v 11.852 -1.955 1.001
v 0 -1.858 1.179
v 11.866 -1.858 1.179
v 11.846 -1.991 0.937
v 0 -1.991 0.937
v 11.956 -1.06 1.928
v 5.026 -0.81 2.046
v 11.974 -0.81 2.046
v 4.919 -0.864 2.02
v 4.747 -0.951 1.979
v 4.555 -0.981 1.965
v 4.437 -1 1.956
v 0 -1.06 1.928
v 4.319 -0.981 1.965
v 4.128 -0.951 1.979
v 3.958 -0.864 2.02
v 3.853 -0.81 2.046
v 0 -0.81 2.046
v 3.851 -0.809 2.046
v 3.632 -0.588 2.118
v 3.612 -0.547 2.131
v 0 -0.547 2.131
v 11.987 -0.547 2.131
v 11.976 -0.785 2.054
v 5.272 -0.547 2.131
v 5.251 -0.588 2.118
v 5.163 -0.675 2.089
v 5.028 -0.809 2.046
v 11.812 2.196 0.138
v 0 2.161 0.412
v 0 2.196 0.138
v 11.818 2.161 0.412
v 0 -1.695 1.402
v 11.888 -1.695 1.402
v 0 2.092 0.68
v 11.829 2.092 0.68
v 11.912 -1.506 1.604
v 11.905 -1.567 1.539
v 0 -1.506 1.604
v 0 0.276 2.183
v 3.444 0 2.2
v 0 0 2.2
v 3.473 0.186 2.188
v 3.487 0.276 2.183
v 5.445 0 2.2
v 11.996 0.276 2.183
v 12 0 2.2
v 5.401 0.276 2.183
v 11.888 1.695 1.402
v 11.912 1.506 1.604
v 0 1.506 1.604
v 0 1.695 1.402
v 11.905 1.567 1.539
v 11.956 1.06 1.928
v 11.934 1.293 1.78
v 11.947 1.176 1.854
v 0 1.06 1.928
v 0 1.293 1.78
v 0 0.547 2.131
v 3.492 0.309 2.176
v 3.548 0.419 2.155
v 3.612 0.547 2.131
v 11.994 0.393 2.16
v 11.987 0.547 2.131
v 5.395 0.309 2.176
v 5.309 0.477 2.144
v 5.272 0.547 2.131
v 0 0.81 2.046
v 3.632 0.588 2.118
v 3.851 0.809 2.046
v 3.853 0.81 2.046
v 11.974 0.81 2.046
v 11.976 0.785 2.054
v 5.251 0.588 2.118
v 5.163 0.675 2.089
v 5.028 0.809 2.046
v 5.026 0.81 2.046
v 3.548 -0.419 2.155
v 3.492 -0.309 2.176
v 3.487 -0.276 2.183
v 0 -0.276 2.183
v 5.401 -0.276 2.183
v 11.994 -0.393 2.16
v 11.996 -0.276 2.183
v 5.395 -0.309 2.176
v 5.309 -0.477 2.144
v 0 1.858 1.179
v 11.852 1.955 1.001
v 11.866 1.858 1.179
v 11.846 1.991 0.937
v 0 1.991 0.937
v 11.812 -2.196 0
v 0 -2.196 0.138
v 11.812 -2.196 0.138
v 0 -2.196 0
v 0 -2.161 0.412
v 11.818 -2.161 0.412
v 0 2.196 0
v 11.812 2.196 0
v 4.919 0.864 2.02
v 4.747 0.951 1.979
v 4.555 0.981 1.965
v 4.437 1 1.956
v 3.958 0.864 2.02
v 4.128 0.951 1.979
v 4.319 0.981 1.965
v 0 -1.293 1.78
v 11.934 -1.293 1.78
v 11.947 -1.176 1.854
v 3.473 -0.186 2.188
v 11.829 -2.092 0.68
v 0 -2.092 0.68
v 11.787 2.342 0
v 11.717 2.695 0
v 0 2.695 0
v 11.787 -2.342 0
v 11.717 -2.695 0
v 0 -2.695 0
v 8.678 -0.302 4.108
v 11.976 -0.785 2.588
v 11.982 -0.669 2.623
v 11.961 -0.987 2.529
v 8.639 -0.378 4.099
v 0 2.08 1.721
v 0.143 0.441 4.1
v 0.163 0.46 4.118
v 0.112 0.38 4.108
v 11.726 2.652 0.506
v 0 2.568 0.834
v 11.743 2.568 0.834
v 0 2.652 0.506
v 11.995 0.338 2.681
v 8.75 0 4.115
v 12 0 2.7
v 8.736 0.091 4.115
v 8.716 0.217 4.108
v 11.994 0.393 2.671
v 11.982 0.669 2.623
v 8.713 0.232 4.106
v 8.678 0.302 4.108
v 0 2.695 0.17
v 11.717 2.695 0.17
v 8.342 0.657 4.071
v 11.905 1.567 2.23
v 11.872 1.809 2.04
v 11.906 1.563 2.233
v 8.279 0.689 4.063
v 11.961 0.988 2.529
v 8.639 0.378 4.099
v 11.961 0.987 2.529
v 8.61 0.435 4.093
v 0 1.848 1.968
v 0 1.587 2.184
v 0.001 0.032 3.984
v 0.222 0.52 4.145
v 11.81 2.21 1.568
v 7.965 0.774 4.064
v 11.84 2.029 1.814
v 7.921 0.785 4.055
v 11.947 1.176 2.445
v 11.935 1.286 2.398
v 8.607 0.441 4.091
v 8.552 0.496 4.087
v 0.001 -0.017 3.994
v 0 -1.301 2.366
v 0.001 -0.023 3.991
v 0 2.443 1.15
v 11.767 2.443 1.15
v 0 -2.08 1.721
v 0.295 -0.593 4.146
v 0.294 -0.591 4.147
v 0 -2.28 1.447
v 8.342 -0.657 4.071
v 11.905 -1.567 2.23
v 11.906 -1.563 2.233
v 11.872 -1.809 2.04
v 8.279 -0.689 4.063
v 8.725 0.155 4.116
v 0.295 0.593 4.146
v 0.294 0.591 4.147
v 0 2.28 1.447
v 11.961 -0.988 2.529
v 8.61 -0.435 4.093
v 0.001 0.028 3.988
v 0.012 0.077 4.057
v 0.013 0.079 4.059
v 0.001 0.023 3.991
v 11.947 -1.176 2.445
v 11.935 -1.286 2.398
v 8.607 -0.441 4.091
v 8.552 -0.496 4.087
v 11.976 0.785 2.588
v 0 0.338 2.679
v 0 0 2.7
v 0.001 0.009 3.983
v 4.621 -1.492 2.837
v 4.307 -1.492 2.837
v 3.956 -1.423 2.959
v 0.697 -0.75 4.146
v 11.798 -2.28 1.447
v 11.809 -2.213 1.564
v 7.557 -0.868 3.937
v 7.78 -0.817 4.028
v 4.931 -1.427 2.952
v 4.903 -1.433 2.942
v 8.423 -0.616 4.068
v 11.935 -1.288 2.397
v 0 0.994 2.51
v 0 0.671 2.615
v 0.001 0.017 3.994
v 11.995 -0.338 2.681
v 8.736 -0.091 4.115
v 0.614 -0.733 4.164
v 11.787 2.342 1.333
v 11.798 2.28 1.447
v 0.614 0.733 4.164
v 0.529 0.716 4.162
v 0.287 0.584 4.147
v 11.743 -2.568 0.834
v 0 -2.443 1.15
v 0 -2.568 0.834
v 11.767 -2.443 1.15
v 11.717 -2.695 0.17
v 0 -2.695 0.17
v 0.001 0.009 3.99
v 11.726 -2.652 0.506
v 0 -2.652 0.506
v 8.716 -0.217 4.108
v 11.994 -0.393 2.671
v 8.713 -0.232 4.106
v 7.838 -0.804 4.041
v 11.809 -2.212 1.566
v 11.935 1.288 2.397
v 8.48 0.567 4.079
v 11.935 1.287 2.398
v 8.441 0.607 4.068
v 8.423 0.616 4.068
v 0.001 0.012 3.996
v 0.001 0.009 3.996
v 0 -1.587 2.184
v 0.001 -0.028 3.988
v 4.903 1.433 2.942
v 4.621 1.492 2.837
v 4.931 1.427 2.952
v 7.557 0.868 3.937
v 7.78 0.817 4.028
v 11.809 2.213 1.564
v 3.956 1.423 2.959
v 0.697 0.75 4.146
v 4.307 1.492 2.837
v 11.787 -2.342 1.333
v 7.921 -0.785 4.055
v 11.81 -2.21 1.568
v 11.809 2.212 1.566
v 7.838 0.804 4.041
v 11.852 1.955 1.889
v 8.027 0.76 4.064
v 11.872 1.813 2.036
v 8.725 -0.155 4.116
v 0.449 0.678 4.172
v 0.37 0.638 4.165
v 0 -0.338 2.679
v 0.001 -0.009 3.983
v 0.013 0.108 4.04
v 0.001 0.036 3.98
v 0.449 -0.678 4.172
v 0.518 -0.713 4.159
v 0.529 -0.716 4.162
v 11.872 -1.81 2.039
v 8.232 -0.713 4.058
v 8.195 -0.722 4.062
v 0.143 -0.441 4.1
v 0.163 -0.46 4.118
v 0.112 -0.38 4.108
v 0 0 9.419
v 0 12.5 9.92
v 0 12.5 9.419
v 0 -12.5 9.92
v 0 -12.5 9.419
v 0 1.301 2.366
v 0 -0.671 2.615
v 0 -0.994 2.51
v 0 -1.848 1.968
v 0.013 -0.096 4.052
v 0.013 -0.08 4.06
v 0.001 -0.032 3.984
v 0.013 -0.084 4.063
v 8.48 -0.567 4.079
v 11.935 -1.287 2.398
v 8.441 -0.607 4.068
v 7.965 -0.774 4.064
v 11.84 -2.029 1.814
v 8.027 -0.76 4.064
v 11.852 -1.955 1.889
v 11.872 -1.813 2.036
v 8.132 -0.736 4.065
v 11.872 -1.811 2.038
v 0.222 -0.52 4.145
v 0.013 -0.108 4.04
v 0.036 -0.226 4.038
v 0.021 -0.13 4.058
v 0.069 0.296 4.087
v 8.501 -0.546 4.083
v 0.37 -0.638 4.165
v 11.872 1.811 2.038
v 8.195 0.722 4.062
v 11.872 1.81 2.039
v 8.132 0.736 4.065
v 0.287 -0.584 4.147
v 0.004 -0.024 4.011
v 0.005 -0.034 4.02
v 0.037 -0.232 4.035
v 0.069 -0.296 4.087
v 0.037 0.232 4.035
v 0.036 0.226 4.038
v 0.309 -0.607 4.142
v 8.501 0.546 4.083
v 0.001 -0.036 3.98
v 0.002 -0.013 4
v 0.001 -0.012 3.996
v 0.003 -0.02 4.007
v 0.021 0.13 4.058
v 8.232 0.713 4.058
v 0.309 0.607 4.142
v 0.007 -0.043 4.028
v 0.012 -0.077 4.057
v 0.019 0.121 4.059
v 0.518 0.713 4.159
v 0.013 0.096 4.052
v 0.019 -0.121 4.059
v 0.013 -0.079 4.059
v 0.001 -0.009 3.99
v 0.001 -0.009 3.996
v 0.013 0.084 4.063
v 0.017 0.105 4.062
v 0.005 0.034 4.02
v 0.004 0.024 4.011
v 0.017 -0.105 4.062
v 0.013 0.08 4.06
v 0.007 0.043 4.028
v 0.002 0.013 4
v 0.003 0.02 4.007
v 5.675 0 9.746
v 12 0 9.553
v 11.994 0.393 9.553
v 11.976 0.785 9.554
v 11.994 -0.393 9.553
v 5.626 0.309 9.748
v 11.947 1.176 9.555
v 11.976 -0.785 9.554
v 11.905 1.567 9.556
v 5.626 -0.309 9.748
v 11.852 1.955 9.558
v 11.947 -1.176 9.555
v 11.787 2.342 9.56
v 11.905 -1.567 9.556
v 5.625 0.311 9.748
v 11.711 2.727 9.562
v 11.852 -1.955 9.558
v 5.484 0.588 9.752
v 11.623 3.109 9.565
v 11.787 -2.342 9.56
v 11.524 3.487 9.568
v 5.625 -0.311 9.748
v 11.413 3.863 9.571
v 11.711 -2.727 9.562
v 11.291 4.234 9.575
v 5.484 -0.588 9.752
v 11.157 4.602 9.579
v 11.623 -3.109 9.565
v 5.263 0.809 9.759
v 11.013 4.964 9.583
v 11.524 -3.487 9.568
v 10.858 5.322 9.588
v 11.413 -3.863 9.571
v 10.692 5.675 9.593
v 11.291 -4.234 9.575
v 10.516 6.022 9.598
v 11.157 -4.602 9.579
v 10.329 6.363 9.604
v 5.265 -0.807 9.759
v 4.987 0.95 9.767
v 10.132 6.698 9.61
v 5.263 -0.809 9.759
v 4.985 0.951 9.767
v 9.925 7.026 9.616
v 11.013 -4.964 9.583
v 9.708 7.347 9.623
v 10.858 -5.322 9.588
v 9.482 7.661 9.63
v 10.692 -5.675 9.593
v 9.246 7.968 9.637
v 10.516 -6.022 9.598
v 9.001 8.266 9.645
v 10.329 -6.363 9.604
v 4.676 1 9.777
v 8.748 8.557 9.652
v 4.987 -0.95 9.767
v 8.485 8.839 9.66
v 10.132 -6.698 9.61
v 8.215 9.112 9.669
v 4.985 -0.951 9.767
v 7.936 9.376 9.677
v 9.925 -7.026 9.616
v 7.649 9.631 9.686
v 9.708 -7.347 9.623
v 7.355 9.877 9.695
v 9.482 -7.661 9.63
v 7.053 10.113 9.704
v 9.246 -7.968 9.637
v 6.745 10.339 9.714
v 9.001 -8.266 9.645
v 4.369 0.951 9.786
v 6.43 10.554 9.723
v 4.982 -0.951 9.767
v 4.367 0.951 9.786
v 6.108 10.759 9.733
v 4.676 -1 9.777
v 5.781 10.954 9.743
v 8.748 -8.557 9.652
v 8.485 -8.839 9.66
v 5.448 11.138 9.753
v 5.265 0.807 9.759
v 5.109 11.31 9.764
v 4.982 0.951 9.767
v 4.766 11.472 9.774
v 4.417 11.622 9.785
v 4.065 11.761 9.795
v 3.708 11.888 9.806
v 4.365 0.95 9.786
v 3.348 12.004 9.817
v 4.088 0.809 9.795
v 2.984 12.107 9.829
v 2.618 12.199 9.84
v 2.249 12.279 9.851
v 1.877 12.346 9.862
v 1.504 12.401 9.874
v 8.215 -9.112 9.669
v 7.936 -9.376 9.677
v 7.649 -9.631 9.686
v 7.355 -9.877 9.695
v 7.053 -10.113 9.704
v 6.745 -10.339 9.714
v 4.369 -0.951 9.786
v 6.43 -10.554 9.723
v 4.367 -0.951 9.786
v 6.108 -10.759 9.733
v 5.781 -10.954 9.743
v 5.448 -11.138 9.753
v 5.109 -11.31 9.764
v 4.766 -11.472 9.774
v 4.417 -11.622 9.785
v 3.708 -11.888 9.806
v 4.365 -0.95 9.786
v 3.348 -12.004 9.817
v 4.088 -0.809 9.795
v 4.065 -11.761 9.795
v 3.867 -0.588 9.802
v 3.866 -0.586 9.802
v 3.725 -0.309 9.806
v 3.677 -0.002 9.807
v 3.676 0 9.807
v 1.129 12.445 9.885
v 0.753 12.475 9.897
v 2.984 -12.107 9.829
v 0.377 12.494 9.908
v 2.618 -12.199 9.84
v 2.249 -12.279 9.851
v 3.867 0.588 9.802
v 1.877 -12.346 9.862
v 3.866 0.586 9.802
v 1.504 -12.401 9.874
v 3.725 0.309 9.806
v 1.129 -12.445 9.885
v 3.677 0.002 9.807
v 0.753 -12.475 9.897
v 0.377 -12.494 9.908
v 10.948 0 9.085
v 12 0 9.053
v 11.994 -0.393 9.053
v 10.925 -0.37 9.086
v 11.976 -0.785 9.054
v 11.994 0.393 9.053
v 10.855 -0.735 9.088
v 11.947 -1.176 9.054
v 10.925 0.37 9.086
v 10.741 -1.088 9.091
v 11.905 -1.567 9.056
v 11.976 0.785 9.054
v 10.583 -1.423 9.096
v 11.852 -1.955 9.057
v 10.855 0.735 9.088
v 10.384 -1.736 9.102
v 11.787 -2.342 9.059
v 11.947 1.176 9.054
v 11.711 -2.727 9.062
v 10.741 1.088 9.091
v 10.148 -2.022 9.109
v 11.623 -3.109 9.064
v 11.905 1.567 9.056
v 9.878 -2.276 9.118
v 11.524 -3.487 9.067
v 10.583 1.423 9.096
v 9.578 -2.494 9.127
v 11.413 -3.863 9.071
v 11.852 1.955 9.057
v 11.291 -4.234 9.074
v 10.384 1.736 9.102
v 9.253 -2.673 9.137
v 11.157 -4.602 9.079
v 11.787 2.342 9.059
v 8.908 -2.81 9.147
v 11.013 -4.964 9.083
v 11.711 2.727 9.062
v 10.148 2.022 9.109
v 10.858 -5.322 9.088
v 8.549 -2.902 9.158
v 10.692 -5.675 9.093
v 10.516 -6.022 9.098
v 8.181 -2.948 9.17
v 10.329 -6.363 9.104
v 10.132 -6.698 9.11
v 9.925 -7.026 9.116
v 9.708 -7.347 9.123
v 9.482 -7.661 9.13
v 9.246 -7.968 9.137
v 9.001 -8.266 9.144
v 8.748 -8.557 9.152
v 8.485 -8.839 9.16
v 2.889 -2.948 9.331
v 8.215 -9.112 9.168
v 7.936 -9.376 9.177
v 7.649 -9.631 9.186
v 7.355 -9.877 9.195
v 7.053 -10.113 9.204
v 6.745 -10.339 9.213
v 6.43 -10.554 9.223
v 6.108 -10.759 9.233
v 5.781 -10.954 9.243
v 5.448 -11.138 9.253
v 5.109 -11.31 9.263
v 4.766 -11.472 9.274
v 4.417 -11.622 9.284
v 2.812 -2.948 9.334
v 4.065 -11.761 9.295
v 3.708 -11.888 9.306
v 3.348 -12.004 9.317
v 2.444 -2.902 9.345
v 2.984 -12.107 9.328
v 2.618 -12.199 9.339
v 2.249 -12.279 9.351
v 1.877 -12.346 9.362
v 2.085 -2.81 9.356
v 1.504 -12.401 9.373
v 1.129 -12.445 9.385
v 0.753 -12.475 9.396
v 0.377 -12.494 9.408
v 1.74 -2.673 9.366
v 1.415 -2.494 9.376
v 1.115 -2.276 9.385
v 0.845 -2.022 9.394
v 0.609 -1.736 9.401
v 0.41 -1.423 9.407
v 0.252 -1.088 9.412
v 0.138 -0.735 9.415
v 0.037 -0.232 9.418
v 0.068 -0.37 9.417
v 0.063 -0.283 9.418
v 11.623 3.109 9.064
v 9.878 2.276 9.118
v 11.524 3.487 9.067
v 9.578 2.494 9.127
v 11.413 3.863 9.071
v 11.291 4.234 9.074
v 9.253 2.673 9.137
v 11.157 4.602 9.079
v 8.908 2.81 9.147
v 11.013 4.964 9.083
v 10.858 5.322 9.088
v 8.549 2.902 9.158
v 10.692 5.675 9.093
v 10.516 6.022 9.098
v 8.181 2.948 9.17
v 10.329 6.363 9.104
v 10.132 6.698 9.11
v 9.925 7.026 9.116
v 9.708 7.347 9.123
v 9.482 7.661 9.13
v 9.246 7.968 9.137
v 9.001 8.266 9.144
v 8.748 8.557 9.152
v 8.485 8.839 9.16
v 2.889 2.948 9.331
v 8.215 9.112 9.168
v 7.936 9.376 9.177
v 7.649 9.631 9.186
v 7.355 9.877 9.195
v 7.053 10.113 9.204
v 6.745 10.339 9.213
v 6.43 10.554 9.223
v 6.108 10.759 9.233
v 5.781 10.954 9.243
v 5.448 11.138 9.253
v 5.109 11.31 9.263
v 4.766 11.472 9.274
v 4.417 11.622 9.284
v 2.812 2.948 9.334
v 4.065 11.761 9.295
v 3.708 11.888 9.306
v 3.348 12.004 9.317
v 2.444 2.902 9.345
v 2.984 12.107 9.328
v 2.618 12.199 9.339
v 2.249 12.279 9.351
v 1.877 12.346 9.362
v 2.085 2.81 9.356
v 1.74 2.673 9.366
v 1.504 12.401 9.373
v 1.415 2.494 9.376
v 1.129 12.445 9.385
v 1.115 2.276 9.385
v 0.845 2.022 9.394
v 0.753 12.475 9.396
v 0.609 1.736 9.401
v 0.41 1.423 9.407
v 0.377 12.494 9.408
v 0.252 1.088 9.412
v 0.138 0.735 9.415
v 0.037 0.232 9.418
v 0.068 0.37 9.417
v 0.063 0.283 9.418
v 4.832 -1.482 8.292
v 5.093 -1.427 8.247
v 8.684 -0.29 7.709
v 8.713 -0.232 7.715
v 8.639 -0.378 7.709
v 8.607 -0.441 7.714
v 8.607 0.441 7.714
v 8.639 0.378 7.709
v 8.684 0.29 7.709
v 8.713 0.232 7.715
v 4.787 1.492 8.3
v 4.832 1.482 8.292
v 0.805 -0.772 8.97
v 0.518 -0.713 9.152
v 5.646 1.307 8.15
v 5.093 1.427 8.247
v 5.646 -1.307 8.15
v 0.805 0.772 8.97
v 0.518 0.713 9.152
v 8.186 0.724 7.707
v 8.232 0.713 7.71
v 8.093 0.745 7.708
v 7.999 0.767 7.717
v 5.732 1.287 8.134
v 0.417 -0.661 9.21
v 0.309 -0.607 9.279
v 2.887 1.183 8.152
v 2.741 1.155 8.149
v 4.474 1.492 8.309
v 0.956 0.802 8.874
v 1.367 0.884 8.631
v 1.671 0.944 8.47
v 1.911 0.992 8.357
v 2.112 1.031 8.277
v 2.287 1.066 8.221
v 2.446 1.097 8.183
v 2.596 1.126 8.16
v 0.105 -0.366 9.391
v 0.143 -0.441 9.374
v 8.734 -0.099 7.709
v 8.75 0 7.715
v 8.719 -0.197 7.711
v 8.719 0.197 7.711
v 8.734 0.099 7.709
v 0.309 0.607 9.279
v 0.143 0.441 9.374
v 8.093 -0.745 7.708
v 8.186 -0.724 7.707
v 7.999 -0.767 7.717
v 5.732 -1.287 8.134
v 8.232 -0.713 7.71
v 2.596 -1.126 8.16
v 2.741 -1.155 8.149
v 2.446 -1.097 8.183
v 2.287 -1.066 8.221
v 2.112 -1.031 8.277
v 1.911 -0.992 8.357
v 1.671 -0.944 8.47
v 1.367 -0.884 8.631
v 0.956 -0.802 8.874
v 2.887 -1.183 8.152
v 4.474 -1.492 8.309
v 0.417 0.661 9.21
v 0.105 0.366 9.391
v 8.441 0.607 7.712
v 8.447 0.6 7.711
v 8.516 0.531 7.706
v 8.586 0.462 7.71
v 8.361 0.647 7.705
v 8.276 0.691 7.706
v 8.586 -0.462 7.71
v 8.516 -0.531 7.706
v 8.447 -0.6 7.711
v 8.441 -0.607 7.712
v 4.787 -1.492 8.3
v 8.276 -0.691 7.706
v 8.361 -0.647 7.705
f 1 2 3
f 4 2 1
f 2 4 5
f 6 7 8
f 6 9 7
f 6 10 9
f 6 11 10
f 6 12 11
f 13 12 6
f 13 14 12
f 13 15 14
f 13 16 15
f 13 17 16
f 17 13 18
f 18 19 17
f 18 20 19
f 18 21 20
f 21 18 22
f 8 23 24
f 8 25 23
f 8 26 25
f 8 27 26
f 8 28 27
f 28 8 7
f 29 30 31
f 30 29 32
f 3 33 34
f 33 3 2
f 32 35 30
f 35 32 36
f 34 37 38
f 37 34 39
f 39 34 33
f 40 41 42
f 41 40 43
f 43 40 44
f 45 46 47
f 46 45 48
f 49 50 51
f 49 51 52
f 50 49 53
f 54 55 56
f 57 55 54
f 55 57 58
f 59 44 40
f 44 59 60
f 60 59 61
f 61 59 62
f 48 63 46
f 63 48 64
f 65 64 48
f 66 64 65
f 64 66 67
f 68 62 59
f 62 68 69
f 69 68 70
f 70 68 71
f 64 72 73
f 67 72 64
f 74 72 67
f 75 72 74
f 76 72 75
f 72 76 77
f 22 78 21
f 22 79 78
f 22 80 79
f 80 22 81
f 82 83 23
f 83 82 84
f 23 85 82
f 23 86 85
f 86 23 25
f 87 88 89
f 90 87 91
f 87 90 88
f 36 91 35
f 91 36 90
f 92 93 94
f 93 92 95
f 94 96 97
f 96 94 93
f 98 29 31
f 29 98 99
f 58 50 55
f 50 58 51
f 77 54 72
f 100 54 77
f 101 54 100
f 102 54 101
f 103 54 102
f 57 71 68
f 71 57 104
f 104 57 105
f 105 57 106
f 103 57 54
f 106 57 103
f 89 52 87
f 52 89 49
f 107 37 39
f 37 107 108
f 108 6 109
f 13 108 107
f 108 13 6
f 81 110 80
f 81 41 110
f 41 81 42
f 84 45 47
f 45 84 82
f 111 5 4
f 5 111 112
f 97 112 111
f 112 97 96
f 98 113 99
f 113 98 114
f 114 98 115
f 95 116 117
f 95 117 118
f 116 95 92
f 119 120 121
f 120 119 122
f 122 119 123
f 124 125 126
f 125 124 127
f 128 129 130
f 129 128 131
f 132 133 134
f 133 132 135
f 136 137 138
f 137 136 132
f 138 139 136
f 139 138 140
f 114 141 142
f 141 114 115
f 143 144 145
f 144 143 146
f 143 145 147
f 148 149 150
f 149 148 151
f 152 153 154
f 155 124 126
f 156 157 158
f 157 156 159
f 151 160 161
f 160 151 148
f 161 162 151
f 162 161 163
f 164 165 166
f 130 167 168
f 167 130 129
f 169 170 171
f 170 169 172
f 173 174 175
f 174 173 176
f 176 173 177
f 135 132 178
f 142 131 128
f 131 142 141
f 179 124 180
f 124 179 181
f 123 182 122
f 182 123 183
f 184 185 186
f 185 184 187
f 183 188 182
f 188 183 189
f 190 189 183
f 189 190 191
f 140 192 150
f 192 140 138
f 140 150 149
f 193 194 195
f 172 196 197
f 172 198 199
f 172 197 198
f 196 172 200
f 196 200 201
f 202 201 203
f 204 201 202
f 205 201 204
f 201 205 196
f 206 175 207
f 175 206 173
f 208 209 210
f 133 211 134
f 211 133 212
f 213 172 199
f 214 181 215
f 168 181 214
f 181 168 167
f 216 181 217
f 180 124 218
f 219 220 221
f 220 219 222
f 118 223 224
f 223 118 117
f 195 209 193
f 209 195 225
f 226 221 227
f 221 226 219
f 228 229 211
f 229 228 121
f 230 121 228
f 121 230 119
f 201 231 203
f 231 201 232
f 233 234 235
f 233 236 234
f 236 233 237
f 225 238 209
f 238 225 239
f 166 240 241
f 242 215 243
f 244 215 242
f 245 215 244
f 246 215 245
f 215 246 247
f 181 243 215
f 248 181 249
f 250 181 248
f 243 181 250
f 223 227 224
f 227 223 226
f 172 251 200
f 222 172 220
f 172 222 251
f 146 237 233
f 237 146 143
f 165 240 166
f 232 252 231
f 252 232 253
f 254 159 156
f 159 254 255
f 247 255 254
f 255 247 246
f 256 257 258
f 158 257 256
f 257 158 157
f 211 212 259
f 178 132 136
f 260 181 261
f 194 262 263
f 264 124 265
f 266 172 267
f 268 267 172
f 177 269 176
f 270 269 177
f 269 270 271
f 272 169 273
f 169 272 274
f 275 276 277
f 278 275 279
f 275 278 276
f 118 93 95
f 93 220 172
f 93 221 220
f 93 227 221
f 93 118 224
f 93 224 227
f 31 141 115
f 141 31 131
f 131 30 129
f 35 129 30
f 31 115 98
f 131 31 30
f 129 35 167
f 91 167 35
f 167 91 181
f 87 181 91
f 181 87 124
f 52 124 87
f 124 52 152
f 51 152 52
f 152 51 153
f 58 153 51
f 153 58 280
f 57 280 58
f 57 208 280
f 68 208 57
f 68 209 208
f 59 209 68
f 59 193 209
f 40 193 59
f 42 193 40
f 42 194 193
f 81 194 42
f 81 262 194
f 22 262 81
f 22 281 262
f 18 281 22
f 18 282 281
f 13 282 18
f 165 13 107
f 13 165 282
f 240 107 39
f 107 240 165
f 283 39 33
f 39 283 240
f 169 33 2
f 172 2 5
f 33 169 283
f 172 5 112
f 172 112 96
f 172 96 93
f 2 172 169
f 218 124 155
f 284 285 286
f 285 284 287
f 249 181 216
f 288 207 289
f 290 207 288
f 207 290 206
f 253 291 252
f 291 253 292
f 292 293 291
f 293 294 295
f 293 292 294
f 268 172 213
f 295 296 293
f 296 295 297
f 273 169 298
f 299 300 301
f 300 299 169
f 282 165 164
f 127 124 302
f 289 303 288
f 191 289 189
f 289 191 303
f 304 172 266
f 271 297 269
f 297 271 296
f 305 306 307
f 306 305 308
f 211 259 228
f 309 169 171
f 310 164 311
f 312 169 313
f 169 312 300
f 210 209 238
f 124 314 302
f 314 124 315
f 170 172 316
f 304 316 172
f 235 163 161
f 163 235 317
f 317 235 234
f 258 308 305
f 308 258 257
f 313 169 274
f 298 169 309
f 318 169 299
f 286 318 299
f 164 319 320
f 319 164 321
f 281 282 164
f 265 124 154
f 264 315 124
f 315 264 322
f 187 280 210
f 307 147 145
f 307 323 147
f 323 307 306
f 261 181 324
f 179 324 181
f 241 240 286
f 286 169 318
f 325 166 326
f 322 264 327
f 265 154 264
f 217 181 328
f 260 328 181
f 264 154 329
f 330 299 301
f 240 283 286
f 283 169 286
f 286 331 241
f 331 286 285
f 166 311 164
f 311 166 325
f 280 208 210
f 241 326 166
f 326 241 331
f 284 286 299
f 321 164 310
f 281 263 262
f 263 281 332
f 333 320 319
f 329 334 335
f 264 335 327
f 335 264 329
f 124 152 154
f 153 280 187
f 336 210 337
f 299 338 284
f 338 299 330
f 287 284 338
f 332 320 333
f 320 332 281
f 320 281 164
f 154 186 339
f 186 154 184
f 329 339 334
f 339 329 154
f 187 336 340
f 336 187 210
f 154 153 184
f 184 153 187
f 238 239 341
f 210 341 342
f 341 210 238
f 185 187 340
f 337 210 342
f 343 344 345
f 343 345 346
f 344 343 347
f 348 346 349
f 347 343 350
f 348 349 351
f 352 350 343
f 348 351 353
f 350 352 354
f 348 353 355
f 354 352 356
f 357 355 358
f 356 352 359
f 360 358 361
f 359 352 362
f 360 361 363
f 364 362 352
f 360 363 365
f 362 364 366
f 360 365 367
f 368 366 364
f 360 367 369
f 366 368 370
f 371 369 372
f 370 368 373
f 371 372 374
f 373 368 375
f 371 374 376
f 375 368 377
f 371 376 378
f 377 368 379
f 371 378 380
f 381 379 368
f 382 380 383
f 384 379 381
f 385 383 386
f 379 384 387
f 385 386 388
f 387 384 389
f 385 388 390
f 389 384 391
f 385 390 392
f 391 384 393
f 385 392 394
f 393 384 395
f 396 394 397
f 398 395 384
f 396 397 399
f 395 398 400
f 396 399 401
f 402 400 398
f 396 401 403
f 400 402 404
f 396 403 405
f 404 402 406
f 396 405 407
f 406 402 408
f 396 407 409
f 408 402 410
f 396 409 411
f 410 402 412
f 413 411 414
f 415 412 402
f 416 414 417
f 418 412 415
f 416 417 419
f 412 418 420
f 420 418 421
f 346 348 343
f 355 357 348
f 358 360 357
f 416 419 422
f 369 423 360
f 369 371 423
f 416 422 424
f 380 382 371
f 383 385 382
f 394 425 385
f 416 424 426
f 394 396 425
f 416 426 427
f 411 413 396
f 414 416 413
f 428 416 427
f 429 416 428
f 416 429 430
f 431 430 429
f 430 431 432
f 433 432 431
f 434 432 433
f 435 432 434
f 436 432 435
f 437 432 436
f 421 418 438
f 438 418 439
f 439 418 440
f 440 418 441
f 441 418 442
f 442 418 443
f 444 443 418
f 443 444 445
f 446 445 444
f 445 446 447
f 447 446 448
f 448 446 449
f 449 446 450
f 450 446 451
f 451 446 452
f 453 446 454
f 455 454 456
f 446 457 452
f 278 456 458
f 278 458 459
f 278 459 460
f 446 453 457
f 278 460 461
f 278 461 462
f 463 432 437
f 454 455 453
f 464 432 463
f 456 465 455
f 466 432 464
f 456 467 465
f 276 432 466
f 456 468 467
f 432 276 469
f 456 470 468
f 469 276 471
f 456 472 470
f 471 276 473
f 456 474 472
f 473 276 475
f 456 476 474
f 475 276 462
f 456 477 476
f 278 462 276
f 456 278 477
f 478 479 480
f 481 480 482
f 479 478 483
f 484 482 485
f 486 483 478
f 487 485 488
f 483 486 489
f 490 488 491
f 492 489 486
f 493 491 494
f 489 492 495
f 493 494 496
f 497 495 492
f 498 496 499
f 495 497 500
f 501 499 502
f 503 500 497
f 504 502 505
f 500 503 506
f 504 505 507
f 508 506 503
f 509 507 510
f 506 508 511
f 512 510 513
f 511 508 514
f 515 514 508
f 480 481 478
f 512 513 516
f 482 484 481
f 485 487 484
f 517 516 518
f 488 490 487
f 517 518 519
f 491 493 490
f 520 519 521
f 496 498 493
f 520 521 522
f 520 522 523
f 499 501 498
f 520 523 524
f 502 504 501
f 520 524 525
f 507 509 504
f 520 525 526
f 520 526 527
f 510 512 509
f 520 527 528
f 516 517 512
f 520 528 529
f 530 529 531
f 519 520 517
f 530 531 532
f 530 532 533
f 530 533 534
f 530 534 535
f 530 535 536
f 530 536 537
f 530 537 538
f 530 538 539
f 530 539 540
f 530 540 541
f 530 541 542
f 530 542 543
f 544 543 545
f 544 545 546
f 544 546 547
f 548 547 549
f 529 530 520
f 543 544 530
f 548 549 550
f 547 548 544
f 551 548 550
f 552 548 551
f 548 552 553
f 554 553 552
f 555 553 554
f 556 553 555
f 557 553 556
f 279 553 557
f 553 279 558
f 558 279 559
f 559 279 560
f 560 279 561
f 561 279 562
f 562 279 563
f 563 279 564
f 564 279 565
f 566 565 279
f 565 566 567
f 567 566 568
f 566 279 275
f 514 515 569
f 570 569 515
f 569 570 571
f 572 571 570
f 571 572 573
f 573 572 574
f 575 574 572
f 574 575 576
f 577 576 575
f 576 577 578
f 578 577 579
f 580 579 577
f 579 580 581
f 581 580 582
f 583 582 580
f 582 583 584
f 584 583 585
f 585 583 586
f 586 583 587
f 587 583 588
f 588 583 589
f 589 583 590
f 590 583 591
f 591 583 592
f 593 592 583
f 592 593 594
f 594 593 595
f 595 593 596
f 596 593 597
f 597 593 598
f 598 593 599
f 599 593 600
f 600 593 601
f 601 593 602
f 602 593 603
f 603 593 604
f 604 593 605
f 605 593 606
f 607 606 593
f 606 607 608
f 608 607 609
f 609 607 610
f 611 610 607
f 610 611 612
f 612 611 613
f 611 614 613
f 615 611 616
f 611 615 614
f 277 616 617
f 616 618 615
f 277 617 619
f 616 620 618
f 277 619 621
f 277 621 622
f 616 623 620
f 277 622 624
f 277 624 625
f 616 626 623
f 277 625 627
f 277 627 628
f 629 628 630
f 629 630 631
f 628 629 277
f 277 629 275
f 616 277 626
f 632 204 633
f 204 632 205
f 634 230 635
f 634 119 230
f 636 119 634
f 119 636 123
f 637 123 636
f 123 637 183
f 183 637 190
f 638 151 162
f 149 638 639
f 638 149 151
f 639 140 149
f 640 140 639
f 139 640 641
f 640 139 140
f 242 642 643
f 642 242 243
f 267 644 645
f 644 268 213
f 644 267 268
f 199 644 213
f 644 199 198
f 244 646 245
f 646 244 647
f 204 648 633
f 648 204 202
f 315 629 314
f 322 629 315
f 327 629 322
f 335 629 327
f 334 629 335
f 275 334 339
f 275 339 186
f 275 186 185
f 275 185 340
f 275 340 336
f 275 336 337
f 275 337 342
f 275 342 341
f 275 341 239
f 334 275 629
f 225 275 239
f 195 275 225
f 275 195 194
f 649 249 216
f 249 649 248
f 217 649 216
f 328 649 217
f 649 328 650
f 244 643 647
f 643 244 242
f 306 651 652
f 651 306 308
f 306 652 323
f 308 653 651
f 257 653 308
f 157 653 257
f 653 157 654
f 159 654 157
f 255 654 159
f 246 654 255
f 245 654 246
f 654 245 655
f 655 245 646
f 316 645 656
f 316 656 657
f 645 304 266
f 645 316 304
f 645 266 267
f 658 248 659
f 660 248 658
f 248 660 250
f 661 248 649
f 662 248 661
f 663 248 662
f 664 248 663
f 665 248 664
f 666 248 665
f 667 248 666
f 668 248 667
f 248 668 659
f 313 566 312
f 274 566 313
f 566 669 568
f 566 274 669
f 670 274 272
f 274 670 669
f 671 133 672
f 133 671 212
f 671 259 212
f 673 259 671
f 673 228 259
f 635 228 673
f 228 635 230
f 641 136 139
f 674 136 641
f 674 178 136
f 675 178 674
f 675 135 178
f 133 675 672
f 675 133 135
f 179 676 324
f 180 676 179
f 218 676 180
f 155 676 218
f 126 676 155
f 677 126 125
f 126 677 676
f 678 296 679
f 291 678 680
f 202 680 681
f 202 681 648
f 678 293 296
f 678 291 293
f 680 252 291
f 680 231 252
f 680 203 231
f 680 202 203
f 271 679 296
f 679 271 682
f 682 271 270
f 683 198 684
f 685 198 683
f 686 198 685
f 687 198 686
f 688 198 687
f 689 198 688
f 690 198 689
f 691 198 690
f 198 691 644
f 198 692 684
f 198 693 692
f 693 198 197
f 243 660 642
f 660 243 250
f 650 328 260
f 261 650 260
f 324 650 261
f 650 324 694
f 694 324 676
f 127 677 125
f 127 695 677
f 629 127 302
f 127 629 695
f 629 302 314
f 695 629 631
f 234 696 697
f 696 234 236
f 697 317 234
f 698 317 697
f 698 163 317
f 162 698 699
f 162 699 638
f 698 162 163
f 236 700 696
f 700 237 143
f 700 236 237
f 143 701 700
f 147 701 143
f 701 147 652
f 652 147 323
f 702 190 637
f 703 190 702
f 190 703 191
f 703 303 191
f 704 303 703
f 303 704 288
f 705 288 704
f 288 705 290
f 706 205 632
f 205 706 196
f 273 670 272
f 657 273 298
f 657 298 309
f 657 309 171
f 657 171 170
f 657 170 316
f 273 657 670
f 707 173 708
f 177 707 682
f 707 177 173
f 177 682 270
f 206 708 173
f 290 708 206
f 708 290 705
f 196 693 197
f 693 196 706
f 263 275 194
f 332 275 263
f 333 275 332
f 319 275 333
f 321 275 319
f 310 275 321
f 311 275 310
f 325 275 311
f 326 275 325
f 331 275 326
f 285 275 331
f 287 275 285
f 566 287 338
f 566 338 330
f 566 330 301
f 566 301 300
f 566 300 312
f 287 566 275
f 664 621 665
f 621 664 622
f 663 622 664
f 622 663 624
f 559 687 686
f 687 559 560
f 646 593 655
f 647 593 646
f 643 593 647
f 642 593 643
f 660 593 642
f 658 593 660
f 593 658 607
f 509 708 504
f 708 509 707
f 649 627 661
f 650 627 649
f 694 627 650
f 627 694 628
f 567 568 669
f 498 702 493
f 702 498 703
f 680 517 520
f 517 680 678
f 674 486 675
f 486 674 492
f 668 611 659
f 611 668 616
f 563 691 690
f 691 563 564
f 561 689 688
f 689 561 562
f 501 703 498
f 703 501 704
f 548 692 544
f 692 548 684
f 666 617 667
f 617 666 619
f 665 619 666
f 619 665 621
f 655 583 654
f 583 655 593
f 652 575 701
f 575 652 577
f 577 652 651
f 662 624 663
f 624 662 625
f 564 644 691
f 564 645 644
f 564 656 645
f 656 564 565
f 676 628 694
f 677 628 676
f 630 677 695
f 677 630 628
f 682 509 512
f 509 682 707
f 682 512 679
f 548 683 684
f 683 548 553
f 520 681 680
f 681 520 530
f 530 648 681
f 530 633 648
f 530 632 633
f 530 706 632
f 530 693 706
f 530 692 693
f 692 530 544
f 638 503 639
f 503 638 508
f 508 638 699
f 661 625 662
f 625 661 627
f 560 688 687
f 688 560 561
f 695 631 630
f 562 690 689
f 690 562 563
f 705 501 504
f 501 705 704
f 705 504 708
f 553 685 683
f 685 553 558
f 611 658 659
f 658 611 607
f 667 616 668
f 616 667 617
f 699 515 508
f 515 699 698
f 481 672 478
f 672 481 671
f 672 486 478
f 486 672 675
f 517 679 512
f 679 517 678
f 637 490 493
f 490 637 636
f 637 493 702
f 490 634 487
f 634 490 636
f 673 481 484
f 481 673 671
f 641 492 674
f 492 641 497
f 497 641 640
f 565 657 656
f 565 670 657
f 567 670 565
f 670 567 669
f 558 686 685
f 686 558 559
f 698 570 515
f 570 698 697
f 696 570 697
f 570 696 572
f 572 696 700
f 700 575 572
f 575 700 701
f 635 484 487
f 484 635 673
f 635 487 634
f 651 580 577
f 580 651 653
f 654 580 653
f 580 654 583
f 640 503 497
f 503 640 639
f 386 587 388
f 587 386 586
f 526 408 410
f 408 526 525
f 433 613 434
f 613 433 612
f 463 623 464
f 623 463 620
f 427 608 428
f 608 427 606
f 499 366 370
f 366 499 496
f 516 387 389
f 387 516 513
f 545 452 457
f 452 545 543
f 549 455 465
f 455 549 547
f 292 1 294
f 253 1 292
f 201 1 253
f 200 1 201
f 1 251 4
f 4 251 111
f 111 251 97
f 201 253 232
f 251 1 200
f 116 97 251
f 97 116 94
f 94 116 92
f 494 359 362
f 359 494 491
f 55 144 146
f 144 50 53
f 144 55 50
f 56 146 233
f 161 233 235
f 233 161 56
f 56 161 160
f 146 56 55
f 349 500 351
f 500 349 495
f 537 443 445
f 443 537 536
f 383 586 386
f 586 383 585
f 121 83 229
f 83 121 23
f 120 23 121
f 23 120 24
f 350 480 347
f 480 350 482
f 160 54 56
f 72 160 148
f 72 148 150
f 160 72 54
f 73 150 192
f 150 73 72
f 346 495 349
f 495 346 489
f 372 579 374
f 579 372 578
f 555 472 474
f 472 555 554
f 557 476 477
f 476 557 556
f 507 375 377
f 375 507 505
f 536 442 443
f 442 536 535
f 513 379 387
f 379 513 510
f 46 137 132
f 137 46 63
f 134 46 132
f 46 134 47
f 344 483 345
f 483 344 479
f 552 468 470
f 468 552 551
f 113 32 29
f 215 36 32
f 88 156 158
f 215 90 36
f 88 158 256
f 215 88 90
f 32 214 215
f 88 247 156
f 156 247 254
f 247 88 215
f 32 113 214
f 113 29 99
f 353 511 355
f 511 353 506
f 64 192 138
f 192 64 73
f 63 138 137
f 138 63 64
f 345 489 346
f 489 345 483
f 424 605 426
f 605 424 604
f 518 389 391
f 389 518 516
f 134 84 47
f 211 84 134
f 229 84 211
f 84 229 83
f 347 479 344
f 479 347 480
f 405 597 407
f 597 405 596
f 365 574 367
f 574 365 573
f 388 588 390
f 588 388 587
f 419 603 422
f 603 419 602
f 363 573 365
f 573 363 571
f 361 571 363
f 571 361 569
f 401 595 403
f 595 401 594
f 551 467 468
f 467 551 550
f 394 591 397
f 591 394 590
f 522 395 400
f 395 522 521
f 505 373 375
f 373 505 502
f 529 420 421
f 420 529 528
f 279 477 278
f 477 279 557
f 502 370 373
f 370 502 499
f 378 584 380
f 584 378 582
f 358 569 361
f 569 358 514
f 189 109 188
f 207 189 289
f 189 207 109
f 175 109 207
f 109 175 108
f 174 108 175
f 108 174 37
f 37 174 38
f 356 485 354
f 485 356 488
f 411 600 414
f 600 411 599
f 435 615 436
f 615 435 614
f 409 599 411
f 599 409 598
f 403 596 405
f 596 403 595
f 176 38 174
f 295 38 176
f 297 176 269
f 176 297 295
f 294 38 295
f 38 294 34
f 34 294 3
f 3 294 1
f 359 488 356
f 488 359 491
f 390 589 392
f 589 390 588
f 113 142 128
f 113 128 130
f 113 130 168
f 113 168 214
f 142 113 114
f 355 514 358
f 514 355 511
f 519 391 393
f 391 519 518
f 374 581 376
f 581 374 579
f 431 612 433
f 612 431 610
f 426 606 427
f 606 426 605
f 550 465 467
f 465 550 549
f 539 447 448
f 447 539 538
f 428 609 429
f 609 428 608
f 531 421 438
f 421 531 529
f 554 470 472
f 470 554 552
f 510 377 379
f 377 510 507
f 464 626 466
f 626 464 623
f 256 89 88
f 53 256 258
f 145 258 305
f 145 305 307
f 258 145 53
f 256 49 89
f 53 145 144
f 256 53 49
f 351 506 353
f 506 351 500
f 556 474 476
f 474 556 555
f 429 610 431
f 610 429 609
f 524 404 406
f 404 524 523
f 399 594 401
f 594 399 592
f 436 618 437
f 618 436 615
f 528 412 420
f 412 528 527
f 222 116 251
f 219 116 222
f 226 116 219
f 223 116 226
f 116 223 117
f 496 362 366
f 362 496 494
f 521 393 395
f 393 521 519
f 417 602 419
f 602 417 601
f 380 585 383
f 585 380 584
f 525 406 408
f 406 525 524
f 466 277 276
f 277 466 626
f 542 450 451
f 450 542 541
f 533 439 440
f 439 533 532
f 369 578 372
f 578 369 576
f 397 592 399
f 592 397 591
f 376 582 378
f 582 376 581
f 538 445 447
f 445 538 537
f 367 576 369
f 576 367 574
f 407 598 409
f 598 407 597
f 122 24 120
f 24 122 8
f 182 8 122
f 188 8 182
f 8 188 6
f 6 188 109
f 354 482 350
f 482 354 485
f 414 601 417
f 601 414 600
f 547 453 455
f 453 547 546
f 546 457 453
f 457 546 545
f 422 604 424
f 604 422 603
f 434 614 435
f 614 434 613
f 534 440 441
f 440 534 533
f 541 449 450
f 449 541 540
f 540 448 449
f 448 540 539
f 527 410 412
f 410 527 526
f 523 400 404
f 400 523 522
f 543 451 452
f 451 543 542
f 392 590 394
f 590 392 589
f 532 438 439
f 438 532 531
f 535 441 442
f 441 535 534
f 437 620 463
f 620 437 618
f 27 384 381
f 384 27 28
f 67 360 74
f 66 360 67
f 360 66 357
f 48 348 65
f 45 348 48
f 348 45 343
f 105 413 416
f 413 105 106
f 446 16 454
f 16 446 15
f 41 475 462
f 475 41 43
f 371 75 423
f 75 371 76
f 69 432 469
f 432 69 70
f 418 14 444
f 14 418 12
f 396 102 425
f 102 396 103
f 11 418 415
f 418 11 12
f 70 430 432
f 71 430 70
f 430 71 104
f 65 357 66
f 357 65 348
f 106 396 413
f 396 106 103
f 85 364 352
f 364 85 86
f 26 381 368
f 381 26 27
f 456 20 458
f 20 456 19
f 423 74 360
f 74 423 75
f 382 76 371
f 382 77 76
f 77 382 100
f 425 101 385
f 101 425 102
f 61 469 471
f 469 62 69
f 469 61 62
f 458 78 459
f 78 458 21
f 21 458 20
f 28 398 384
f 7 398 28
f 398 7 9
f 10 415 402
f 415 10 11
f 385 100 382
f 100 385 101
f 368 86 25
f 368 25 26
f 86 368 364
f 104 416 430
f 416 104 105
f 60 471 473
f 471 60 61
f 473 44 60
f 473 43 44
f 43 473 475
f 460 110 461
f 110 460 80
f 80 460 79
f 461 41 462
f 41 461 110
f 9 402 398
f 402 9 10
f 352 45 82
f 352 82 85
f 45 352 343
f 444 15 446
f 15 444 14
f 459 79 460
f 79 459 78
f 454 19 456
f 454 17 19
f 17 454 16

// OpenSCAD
tailmount_printing = false;
tailmount_tailboom_dia = 4 ;
tailmount_tailboom_clearance = 0.2;
tailmount_tube_wall_thickness = 0.5;
tailmount_pylon_thickness = 1.5;
tailmont_plate_thickness = 0.5;
tailmount_plate_y_len = 25;
tailmount_x_len = 12;
tailmount_standoff_height = 7.75;
tailmount_incidence_angle = 1.75;
tailmount_plate_fillet_width = 2;
tailmount_thread_dia = 2;
tailmount_thread_cylinder_dia = 3;

// x_length
// standoff_height
// tailboom_dia

module tailboom_tube(){
   dia1 = tailmount_tailboom_dia + 2 * tailmount_tailboom_clearance;
   dia2 = dia1 + 2 * tailmount_tube_wall_thickness;
   offset = (dia1 + tailmount_pylon_thickness)/2 +1 ;
   rotate([0,90,0]){
      difference(){
         hull(){
//            translate([-offset,0,0]){
//              cylinder(d= tailmount_pylon_thickness, h = tailmount_x_len/1.5 ,$fn = 20);
//            }
          translate([-offset,0,tailmount_pylon_thickness/2]){
               sphere(d = tailmount_pylon_thickness, $fn = 50);
            }
            translate([-offset,0,tailmount_x_len/1.5 - tailmount_pylon_thickness/2]){
               sphere(d = tailmount_pylon_thickness, $fn = 50);
            }
            cylinder(d= dia2, h = tailmount_x_len,$fn = 50);
//           translate([-0.5,-dia2/2,0]){
//           cube([0.5, dia2    ,tailmount_x_len]);
//           }
         }
         union(){
         translate([0,0,-2]){
            cylinder(d= dia1, h = tailmount_x_len + 4,$fn = 50);
         }
         translate([0,-10,-1]){
            cube([10,20,tailmount_x_len + 4]);
         }
         }
      }
   }
}

module tailmount_plate(){
   offset = tailmount_tailboom_dia /2 +  tailmount_tailboom_clearance + tailmount_standoff_height - tailmont_plate_thickness;
   translate([-1,-tailmount_plate_y_len/2,offset]){
      rotate([0,tailmount_incidence_angle,0]){
         cube ( [tailmount_x_len+2,tailmount_plate_y_len,tailmont_plate_thickness]);
       
      }
   }
}

module tailboom_pylon(){
   h1 = tailmount_x_len * tan(tailmount_incidence_angle);
   hp1 = tailmount_standoff_height - ( tailmount_tube_wall_thickness+ tailmont_plate_thickness/2);
//   pts = [
//   [0,0],
//   [0,hp1 + h1 -0.1],
//   [tailmount_x_len,hp1 -0.1],
//   [tailmount_x_len,0]
//   ];
   offset = tailmount_tailboom_dia/2 
      + tailmount_tailboom_clearance 
      + tailmount_tube_wall_thickness/2;

hull(){
translate([tailmount_pylon_thickness/2,0,offset]){
   cylinder ( d= tailmount_pylon_thickness, h = hp1 + h1 -0.3, $fn = 20);
}

rotate([0,tailmount_incidence_angle,0]){
  translate([(tailmount_x_len/ 1.5 + tailmount_pylon_thickness/2)/2,0,offset]){
      cylinder ( d = tailmount_thread_cylinder_dia, h =hp1 , $fn = 30);
  }
}
translate([tailmount_x_len/ 1.5,0,offset]){
   cylinder ( d= tailmount_pylon_thickness, h = hp1 -0.3, $fn = 20);
}
}

}

module tail_mount_hole()
{
   h1 = tailmount_x_len * tan(tailmount_incidence_angle);
   hp1 = tailmount_standoff_height - ( tailmount_tube_wall_thickness+ tailmont_plate_thickness/2)
 + tailmount_tailboom_clearance +tailmount_tailboom_dia
      + tailmount_tube_wall_thickness/2;
rotate([0,tailmount_incidence_angle,0]){
  translate([(tailmount_x_len/ 1.5 + tailmount_pylon_thickness/2)/2,0, - (tailmount_tailboom_dia/2 + tailmount_tailboom_clearance + tailmount_tube_wall_thickness +0.1)]){
      cylinder ( d = tailmount_thread_dia, h =hp1 +  h1 +1 , $fn = 20);
  }
}
}

module tailmount_plate_fillet()
{
   fw = tailmount_plate_fillet_width;
//   pts = [
//      [-fw,0],
//      [0,-fw * 1.5],
//      [0,fw * 1.5]
//   ];
   z_offset =  tailmount_tailboom_dia /2 +  tailmount_tailboom_clearance + tailmount_standoff_height - tailmont_plate_thickness;
   translate([0,0,z_offset]){
      rotate([0,tailmount_incidence_angle,0]){
//         translate([tailmount_x_len/1.5,0,0]){
//            rotate([0,-90,0]){
//               linear_extrude(height = tailmount_x_len/1.5){
//                  polygon(points = pts);
//               }
//            }
//         }
hull(){
  translate([fw*1.5,0,-fw ]){
      cylinder( d1 = 0, d2 = fw *3, h = fw, $fn = 50);
  }
   translate([tailmount_x_len/ 1.5,0,-fw ]){
      cylinder( d1 = 0, d2 = fw *3, h = fw, $fn = 50);
  }
      }
   }
}
}



module tail_mount(){
  zoffset = tailmount_tailboom_dia/2 +
     tailmount_tailboom_clearance +
     tailmount_tube_wall_thickness ;
cube_height = tailmount_standoff_height +  tailmount_tailboom_dia +
    2* tailmount_tailboom_clearance +
    2* tailmount_tube_wall_thickness;
   difference(){
   
   intersection(){
      union(){
         tailboom_tube();
         tailmount_plate();
         tailboom_pylon();
         tailmount_plate_fillet();

      }
     
      difference(){
        translate([0,0,-zoffset]){
           scale ([2*tailmount_x_len/tailmount_plate_y_len,1,1]){
             cylinder (d= tailmount_plate_y_len , h = 30,$fn = 200);
           }
        }
        translate([-10,-((tailmount_plate_y_len+1)/2),-(zoffset+1)]){
           cube([10,tailmount_plate_y_len+1,cube_height + 2]);
        }
     }
   }
   tail_mount_hole();
   }
}


if ( tailmount_printing)
{
   rotate([0,-90,0]){
      tail_mount();
   }
}else{
 tail_mount();
  // tailboom_pylon();


}

//tailmount_plate();
